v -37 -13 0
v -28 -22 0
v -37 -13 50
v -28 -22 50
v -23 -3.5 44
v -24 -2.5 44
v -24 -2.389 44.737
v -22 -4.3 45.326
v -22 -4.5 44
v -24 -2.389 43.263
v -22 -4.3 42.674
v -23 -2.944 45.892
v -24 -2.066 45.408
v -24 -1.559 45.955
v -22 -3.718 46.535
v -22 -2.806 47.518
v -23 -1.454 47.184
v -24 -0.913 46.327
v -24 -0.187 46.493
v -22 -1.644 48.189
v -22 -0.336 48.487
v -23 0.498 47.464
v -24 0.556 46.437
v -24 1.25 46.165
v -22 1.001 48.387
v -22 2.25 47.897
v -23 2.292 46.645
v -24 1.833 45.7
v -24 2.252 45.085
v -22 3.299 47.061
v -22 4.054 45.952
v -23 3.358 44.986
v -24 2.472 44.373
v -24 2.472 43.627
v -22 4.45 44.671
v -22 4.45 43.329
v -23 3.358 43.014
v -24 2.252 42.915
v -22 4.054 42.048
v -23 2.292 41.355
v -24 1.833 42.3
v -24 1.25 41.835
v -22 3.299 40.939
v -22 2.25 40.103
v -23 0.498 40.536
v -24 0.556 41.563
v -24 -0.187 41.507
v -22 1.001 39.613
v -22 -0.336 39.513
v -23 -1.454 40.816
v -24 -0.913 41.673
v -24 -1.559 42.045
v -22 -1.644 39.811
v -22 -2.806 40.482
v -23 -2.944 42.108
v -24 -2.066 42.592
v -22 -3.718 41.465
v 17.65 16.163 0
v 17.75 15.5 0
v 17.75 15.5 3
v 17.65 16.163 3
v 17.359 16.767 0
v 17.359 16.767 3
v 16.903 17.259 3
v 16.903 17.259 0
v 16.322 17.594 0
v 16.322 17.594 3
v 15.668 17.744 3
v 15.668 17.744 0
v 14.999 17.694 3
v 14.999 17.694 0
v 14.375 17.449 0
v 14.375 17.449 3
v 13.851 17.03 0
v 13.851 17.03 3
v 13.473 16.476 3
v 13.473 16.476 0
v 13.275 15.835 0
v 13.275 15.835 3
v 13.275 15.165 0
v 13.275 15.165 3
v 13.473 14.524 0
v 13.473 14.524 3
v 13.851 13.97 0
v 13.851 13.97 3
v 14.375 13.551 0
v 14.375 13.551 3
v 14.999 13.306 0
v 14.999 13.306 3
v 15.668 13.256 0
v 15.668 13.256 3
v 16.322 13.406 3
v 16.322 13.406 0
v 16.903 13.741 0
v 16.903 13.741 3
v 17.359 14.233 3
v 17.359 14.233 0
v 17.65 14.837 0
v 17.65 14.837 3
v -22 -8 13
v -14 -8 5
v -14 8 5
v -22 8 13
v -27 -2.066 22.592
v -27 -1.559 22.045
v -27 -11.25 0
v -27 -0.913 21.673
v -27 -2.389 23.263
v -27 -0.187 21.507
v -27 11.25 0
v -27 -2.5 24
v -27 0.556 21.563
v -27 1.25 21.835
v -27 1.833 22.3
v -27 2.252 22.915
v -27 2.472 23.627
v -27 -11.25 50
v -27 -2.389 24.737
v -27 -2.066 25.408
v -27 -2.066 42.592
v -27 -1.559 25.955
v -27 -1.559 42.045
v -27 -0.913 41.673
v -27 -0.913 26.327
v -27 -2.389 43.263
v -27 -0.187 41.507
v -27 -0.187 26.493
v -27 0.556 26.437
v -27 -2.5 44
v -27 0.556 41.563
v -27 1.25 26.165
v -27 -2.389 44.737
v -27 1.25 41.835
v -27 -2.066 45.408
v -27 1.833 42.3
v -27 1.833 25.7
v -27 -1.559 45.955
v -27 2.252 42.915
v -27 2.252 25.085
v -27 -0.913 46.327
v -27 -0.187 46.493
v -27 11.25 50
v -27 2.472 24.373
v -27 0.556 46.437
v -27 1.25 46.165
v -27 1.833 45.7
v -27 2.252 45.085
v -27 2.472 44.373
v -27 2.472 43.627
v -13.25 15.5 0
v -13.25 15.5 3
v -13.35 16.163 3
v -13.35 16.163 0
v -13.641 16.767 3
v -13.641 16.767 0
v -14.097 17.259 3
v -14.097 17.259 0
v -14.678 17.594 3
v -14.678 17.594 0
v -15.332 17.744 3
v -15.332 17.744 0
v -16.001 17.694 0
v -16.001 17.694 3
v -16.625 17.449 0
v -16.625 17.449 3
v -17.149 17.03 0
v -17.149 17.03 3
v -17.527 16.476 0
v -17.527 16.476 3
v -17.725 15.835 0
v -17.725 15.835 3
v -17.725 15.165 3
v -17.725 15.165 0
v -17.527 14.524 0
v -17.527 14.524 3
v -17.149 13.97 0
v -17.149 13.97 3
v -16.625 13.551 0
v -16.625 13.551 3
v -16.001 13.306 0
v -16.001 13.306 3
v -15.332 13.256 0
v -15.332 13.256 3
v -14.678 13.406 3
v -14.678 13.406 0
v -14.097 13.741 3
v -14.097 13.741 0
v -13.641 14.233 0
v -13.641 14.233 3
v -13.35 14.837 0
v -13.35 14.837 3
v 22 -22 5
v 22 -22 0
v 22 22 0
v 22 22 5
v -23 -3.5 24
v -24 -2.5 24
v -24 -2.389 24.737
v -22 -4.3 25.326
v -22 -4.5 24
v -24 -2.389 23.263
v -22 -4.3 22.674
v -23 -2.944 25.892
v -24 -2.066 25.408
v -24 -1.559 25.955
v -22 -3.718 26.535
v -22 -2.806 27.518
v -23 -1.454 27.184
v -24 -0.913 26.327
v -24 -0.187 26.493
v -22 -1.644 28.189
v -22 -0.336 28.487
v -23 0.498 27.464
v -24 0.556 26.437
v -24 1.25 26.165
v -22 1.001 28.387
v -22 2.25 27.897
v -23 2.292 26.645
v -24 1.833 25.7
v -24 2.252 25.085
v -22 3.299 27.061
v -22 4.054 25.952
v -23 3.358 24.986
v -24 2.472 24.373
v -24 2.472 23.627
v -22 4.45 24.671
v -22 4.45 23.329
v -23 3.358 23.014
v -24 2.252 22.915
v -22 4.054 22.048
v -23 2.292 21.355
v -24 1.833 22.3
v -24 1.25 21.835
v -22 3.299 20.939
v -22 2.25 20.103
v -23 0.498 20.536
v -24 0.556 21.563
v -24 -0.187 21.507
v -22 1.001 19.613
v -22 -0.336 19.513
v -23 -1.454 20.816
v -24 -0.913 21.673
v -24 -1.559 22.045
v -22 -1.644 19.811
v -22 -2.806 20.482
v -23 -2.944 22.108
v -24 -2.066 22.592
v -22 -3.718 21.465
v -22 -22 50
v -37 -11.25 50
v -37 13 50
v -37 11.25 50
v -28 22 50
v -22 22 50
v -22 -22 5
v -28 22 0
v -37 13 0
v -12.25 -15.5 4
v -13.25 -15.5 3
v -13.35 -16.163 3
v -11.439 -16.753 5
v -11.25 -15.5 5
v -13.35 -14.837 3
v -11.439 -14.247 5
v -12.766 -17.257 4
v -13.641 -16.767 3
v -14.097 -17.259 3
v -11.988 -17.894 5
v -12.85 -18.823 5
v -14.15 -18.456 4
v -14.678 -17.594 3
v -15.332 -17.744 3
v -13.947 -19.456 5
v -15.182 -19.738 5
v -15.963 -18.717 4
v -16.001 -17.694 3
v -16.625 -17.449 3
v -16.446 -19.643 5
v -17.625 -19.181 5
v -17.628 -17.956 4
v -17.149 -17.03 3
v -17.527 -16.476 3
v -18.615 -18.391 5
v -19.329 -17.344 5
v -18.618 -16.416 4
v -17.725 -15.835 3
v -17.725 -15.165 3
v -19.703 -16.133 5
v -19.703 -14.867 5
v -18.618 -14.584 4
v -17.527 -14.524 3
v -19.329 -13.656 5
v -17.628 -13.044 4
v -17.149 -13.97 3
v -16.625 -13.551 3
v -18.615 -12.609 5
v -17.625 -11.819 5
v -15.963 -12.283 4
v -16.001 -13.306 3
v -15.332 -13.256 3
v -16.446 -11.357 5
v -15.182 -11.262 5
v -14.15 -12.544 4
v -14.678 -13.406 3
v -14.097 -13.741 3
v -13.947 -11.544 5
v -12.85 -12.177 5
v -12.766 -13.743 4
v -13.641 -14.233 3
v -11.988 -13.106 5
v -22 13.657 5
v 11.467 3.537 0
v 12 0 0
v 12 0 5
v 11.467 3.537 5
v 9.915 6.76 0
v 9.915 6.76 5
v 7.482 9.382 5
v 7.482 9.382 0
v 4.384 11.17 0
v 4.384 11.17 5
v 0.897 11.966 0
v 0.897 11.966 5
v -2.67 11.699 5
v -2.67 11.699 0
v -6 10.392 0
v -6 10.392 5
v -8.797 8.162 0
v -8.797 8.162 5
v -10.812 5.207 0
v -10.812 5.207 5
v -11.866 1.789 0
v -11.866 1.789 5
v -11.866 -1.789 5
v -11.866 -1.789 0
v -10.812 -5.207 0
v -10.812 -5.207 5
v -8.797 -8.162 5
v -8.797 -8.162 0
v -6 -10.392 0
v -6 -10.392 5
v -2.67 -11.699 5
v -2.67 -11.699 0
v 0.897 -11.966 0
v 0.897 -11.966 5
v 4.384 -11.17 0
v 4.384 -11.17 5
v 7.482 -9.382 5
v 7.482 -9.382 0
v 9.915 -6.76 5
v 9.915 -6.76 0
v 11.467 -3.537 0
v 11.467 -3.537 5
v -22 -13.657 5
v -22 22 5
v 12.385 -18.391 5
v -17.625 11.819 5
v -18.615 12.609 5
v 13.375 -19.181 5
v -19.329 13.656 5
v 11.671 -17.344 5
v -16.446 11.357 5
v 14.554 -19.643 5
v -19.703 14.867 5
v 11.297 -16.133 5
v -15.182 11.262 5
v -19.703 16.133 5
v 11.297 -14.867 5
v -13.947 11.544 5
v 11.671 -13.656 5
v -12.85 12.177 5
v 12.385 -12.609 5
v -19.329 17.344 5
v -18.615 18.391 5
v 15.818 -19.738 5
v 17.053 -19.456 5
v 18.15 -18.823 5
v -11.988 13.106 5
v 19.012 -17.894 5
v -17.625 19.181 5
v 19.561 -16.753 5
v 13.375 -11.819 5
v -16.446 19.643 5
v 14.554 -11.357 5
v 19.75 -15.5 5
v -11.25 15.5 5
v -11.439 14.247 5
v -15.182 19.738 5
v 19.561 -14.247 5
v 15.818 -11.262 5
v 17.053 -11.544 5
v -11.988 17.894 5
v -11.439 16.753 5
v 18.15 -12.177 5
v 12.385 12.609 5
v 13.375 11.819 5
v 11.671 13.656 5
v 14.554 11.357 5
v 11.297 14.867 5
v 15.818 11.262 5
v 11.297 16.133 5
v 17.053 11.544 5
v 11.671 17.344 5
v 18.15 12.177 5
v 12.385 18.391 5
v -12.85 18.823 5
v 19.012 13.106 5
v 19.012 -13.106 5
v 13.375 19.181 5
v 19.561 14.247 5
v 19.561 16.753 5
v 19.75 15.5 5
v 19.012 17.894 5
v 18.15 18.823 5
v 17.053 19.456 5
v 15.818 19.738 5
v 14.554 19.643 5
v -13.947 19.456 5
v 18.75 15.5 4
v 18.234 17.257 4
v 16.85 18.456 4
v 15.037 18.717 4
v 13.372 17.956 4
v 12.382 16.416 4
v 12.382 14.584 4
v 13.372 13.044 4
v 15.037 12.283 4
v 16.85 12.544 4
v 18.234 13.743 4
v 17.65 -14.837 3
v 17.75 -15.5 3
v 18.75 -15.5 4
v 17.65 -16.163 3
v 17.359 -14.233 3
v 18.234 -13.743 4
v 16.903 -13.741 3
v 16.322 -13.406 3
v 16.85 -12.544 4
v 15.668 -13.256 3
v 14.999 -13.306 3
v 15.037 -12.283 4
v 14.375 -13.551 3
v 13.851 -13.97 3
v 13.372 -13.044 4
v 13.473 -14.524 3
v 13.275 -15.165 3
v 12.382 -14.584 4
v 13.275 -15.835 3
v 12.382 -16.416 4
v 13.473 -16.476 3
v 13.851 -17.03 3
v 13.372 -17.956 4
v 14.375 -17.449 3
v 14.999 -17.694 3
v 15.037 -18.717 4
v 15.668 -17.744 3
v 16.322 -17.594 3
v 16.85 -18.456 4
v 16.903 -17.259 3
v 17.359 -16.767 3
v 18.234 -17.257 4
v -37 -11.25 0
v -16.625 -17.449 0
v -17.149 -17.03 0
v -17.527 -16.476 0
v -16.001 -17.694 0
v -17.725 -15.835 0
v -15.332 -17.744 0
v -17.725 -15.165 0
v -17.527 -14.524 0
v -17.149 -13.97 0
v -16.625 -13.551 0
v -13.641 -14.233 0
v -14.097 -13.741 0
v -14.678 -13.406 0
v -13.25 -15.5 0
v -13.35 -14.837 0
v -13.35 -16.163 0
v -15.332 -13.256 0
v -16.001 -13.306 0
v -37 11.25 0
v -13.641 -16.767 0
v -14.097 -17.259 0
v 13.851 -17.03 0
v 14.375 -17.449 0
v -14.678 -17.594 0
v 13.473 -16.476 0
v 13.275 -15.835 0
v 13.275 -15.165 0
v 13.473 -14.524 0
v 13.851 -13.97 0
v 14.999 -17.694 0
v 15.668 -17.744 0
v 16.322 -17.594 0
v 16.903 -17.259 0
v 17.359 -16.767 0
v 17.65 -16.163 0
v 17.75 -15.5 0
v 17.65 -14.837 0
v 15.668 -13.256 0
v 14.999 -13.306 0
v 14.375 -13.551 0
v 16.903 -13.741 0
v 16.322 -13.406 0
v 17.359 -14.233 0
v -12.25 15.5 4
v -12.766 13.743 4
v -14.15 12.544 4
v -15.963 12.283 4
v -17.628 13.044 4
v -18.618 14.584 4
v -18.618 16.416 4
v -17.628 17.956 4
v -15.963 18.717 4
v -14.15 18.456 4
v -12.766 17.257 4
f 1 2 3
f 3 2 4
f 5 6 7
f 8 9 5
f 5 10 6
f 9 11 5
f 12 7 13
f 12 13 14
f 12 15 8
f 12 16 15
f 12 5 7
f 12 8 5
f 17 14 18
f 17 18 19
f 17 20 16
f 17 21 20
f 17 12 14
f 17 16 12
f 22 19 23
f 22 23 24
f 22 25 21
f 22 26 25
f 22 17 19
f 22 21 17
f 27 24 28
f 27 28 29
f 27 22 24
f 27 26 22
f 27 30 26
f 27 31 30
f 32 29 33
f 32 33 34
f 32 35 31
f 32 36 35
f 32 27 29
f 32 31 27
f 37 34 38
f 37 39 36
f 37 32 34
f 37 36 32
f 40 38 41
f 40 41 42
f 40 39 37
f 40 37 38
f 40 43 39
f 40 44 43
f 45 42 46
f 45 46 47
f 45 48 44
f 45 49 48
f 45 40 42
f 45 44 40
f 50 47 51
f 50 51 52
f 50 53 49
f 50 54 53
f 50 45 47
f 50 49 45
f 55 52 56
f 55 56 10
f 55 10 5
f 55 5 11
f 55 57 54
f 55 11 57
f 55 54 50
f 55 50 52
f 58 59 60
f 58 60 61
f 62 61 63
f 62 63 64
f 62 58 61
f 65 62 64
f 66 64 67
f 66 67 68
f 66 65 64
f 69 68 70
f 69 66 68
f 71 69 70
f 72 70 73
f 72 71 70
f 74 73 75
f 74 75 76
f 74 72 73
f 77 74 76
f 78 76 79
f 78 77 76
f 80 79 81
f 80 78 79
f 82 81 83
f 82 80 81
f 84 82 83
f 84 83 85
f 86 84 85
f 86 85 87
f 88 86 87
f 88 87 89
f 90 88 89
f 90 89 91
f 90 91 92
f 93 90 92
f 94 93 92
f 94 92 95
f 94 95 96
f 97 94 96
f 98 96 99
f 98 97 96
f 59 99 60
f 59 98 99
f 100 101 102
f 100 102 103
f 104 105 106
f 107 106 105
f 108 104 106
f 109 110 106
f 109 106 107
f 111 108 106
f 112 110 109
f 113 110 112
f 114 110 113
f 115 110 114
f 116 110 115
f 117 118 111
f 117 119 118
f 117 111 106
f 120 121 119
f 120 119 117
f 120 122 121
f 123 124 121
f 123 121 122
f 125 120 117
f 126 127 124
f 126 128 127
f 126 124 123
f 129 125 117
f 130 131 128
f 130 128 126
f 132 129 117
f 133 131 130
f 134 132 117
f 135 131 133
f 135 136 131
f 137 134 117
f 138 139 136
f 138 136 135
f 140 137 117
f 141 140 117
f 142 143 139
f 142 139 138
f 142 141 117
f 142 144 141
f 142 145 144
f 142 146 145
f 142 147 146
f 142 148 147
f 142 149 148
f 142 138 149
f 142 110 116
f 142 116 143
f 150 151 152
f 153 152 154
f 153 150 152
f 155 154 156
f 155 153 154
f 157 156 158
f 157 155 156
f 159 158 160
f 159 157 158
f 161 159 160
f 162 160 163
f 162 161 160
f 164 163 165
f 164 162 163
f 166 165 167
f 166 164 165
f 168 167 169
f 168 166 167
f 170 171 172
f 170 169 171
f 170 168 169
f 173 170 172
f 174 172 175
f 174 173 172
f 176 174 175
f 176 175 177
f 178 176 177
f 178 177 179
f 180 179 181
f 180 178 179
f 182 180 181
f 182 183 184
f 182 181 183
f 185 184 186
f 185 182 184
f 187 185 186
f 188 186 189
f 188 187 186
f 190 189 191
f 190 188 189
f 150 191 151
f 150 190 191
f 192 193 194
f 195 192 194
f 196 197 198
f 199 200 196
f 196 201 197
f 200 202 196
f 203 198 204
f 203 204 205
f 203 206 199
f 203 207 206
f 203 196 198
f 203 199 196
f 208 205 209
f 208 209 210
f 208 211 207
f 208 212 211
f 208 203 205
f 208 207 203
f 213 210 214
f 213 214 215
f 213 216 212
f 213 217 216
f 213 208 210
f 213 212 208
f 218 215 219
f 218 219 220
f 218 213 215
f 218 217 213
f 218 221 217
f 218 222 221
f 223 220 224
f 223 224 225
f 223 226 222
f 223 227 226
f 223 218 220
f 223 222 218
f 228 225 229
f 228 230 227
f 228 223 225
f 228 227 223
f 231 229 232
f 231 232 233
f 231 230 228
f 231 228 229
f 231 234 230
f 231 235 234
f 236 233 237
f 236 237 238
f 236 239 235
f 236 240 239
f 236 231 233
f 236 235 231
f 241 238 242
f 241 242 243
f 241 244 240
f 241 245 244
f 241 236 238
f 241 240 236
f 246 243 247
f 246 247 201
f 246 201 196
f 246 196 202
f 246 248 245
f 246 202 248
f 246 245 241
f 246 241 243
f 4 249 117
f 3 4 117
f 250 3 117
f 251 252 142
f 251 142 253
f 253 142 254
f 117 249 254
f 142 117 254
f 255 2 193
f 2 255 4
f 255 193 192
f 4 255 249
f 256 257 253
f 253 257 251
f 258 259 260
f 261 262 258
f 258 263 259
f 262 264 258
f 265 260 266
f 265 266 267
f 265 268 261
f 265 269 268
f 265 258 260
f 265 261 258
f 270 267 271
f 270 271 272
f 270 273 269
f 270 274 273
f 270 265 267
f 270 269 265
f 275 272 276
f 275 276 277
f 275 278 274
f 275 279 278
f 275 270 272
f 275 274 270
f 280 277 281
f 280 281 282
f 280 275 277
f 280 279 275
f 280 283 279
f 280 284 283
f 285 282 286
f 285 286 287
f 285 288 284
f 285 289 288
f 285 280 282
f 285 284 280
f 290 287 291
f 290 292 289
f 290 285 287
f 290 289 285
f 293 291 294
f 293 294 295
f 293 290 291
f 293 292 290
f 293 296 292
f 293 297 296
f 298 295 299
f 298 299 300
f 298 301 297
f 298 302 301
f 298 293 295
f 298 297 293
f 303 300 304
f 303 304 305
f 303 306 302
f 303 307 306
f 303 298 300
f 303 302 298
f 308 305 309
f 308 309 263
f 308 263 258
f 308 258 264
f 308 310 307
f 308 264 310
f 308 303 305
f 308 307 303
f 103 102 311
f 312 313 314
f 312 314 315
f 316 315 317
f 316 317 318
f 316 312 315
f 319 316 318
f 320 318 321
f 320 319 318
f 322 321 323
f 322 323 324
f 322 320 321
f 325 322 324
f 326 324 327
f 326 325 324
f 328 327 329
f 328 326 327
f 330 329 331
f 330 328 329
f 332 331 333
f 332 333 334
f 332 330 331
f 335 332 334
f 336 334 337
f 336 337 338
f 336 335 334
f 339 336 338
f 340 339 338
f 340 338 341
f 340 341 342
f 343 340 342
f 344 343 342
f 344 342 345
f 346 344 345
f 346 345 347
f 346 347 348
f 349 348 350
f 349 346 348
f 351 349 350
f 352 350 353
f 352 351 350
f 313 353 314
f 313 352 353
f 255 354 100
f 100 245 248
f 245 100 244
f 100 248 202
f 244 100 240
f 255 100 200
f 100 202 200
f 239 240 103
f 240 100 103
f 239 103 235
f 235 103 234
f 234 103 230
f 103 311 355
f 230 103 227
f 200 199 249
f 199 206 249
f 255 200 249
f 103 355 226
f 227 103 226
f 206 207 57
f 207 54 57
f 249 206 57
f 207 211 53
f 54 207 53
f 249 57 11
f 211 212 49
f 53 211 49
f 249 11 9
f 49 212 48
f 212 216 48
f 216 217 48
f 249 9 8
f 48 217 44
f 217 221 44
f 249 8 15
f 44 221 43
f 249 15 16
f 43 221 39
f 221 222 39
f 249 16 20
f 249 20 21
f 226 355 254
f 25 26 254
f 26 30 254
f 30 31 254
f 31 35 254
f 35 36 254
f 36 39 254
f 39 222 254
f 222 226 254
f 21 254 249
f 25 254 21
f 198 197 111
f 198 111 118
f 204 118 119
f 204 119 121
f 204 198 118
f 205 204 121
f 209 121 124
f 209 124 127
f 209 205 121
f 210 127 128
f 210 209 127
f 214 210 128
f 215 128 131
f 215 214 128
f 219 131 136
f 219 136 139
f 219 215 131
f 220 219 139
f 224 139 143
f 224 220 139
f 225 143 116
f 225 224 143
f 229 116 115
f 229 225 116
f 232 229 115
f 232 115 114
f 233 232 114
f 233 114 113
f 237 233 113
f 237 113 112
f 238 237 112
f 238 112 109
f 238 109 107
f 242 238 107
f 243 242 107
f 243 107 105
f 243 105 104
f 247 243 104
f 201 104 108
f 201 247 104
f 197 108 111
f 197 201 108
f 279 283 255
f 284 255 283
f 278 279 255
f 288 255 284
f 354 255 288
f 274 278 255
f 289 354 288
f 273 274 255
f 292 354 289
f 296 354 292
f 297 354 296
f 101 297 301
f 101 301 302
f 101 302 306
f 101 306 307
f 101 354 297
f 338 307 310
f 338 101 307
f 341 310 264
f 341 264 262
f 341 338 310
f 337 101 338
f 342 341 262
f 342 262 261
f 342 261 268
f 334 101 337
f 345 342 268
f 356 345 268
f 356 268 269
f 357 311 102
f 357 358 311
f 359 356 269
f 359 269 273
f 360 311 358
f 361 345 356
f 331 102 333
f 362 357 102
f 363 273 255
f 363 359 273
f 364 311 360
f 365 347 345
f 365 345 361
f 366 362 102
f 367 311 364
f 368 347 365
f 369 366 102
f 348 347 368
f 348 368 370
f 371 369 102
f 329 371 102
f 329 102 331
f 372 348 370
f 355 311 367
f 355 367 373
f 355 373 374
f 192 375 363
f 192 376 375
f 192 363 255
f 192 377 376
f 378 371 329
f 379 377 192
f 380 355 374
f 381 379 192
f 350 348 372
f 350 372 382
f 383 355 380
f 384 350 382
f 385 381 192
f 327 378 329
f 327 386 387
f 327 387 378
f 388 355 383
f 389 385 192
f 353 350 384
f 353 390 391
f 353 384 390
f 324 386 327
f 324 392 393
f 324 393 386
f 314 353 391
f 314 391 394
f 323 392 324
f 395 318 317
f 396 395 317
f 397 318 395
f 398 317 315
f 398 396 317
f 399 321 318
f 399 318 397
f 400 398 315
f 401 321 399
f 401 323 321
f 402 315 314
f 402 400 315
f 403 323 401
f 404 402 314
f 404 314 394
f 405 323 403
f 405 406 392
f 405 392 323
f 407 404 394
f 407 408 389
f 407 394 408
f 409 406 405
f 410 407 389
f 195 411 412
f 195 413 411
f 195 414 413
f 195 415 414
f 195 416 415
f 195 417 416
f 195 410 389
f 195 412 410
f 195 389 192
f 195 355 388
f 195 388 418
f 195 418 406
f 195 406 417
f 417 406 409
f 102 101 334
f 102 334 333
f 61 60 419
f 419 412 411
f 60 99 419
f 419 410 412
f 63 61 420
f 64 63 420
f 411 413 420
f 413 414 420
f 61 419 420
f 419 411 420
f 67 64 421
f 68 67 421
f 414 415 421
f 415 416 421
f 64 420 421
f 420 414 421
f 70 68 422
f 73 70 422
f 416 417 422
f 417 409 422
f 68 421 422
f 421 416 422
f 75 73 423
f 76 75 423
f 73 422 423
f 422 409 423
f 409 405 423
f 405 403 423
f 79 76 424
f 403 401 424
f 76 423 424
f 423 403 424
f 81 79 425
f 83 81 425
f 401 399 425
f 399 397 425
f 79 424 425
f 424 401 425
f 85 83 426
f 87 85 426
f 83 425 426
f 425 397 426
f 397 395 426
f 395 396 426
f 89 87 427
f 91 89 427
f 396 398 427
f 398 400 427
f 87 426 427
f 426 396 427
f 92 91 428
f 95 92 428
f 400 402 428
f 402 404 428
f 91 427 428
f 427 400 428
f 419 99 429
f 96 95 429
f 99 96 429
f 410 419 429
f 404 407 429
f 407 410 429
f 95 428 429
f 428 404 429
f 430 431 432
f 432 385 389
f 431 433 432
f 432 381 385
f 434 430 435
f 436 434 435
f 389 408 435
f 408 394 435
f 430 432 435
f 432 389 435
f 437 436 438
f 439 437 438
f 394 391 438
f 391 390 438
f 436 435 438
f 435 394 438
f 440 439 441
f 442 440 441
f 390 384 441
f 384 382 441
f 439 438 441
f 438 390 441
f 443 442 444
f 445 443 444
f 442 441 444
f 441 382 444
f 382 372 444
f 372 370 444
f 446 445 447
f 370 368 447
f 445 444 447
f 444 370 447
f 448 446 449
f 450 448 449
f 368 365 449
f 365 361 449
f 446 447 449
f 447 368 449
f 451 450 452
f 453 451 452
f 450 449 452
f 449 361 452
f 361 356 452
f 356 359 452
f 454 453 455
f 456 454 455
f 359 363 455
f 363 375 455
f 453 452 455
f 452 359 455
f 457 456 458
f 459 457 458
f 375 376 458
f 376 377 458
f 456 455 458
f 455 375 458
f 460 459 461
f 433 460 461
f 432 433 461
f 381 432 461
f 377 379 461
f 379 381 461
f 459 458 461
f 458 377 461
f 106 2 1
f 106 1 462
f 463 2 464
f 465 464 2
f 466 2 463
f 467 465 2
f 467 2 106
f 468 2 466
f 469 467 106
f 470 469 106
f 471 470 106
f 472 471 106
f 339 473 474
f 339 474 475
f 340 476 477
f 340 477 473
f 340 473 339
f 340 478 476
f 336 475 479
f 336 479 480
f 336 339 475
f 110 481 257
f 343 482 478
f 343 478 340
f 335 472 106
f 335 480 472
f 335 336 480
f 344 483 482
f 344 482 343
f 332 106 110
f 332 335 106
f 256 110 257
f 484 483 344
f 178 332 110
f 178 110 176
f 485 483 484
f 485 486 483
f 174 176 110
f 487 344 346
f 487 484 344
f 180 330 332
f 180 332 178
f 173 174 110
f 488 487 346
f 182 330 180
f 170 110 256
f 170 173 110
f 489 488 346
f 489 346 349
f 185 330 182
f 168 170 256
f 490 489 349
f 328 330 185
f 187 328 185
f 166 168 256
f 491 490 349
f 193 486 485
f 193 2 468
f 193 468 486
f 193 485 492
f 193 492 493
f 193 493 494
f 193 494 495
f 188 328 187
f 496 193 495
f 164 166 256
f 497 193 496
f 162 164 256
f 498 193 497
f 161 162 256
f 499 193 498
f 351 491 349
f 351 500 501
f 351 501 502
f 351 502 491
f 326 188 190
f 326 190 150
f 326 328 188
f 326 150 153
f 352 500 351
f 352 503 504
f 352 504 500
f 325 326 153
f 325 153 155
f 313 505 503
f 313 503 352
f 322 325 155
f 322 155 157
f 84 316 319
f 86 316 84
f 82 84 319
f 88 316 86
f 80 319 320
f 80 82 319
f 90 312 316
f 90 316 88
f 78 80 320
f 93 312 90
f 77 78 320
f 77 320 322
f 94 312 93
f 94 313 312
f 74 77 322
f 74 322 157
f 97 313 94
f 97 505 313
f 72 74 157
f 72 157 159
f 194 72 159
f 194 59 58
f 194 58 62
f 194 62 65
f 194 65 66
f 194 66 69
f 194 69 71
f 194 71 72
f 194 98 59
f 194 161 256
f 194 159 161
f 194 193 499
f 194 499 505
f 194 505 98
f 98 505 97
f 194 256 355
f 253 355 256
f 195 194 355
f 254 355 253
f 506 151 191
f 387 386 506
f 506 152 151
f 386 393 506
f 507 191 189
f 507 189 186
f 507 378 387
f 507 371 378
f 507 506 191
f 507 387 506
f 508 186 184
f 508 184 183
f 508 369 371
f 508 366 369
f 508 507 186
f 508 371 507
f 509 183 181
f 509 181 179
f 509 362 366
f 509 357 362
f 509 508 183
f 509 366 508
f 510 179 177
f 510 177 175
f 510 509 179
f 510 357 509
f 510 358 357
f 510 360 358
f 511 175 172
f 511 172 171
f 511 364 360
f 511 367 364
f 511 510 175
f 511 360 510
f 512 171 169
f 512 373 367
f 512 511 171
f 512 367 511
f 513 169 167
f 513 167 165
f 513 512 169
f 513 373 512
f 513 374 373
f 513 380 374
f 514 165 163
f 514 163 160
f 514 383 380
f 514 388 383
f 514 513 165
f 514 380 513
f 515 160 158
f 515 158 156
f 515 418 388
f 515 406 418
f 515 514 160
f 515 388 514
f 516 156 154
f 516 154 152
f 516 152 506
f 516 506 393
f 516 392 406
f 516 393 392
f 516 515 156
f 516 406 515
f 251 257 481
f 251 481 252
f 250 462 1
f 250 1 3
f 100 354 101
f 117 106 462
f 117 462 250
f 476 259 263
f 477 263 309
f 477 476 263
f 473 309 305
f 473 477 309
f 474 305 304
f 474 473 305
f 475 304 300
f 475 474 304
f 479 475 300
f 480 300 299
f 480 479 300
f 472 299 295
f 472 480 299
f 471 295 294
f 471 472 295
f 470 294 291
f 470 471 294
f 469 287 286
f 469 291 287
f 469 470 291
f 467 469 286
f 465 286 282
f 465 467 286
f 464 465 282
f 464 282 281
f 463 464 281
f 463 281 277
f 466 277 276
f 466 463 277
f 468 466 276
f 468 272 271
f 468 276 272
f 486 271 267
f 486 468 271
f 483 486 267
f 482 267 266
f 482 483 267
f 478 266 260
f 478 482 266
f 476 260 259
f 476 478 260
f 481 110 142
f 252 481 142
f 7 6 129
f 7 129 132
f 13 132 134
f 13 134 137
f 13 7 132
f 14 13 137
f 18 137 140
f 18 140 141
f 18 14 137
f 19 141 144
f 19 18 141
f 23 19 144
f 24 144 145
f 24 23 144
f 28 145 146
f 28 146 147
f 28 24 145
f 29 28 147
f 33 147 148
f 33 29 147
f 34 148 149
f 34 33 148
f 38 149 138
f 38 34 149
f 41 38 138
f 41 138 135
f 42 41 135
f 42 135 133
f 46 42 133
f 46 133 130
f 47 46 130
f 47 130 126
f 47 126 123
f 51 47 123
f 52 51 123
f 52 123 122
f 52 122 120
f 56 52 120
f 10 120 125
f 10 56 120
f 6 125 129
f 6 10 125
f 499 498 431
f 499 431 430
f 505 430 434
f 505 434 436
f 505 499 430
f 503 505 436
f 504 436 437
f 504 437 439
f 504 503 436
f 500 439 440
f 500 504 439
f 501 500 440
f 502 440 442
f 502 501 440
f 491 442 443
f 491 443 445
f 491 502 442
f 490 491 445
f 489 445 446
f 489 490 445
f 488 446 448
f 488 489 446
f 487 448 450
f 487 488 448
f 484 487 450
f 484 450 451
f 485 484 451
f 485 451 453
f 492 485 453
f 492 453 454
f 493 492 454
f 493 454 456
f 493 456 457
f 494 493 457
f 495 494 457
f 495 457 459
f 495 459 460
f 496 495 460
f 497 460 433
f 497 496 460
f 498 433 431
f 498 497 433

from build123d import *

# Parameters (mm, degrees)
SKETCH1_W           = 44
SKETCH1_H           = 44
SKETCH1_R           = 2.25
SKETCH1_R_2         = 12
BOSS_EXTRUDE1_DEPTH = 5
SKETCH2_W           = 50
SKETCH2_H           = 44
SKETCH2_R           = 2.5
BOSS_EXTRUDE2_DEPTH = 5
BOSS_EXTRUDE3_DEPTH = 15
CHAMFER1_SIZE       = 7
CHAMFER2_SIZE       = 2
SKETCH4_W           = 50
SKETCH4_H           = 10.75
BOSS_EXTRUDE4_DEPTH = 10
CHAMFER3_SIZE       = 9
CHAMFER4_SIZE       = 2


with BuildPart() as part:
    # Sketch1 → Boss-Extrude1 (new body)
    with BuildSketch(Plane.XY):
        Rectangle(SKETCH1_W, SKETCH1_H)
        with Locations((15.5, 15.5)):
            Circle(SKETCH1_R, mode=Mode.SUBTRACT)
        with Locations((15.5, -15.5)):
            Circle(SKETCH1_R, mode=Mode.SUBTRACT)
        with Locations((-15.5, -15.5)):
            Circle(SKETCH1_R, mode=Mode.SUBTRACT)
        with Locations((-15.5, 15.5)):
            Circle(SKETCH1_R, mode=Mode.SUBTRACT)
        Circle(SKETCH1_R_2, mode=Mode.SUBTRACT)
    extrude(amount=BOSS_EXTRUDE1_DEPTH)

    # Sketch2 → Boss-Extrude2 (add)
    with BuildSketch(Plane.ZY.offset(22)):
        with Locations((25, 0)):
            Rectangle(SKETCH2_W, SKETCH2_H)
        with Locations(Location((44, 0, 0), (0, 0, 270))):
            Circle(SKETCH2_R, mode=Mode.SUBTRACT)
        with Locations(Location((24, 0, 0), (0, 0, 270))):
            Circle(SKETCH2_R, mode=Mode.SUBTRACT)
    extrude(amount=BOSS_EXTRUDE2_DEPTH)

    # Sketch3 → Boss-Extrude3 (add, symmetric)
    with BuildSketch(Plane(origin=(0, 0, 0), x_dir=(1, 0, 0), z_dir=(0, 1, 0))):
        Polygon((-14, -5), (-22, -13), (-22, -5), align=None)
    extrude(amount=BOSS_EXTRUDE3_DEPTH, both=True)

    # Chamfer1
    # the kernel refuses this chamfer: 7 mm, written as the material it takes off along each edge
    with BuildSketch(Plane(origin=(-1.270818641, -15, -7.729181359), x_dir=(-0.7068394360706735, -0.02749587661058637, -0.7068394360706736), z_dir=(-0.7071067811865477, 0, 0.7071067811865475))) as chamfer1_piece_1_section:
        Polygon((CHAMFER1_SIZE * 0.999621916911, -CHAMFER1_SIZE * 0.0274958766106), (-CHAMFER1_SIZE * 0.0274958766106, -CHAMFER1_SIZE * 0.999621916911), (0, 0), align=None)
    chamfer1_piece_1 = extrude(amount=47.317270331, mode=Mode.PRIVATE)
    chamfer1_piece_1 = split(chamfer1_piece_1, bisect_by=Plane(origin=(-22, -12.156184448, 8.014329888), z_dir=(1, 0, 0)), keep=Keep.TOP, mode=Mode.PRIVATE)
    chamfer1_piece_1 = split(chamfer1_piece_1, bisect_by=Plane(origin=(-19.249817179, -12.156184448, 5), z_dir=(0, 0, 1)), keep=Keep.TOP, mode=Mode.PRIVATE)
    add(chamfer1_piece_1, mode=Mode.SUBTRACT)
    with BuildSketch(Plane(origin=(-1.270818641, 15, -7.729181359), x_dir=(0.019442520806014066, -0.9996219169112968, 0.019442520806014073), z_dir=(-0.7071067811865477, 0, 0.7071067811865475))) as chamfer1_piece_2_section:
        Polygon((CHAMFER1_SIZE * 0.999621916911, -CHAMFER1_SIZE * 0.0274958766106), (-CHAMFER1_SIZE * 0.0274958766106, -CHAMFER1_SIZE * 0.999621916911), (0, 0), align=None)
    chamfer1_piece_2 = extrude(amount=47.317270331, mode=Mode.PRIVATE)
    chamfer1_piece_2 = split(chamfer1_piece_2, bisect_by=Plane(origin=(-22, 12.156184448, 8.014329888), z_dir=(1, 0, 0)), keep=Keep.TOP, mode=Mode.PRIVATE)
    chamfer1_piece_2 = split(chamfer1_piece_2, bisect_by=Plane(origin=(-19.249817179, 12.156184448, 5), z_dir=(0, 0, 1)), keep=Keep.TOP, mode=Mode.PRIVATE)
    add(chamfer1_piece_2, mode=Mode.SUBTRACT)

    # Chamfer2
    chamfer2_edges = [part.edges().sort_by_distance(p)[0] for p in [
        (-22, 2.5, 44),
        (-22, 2.5, 24),
    ]]
    chamfer(chamfer2_edges, length=CHAMFER2_SIZE)

    # Sketch4 → Boss-Extrude4 (add)
    with BuildSketch(Plane.ZY.offset(27)):
        with Locations((25, 16.625)):
            Rectangle(SKETCH4_W, SKETCH4_H)
        with Locations((25, -16.625)):
            Rectangle(SKETCH4_W, SKETCH4_H)
    extrude(amount=BOSS_EXTRUDE4_DEPTH)

    # Chamfer3
    chamfer3_edges = [part.edges().sort_by_distance(p)[0] for p in [
        (-37, -22, 25),
        (-37, 22, 25),
    ]]
    chamfer(chamfer3_edges, length=CHAMFER3_SIZE)

    # Chamfer4
    chamfer4_edges = [part.edges().sort_by_distance(p)[0] for p in [
        (13.25, 15.5, 5),
        (13.25, -15.5, 5),
        (-17.75, 15.5, 5),
        (-17.75, -15.5, 5),
    ]]
    chamfer(chamfer4_edges, length=CHAMFER4_SIZE)


solid = part.part
